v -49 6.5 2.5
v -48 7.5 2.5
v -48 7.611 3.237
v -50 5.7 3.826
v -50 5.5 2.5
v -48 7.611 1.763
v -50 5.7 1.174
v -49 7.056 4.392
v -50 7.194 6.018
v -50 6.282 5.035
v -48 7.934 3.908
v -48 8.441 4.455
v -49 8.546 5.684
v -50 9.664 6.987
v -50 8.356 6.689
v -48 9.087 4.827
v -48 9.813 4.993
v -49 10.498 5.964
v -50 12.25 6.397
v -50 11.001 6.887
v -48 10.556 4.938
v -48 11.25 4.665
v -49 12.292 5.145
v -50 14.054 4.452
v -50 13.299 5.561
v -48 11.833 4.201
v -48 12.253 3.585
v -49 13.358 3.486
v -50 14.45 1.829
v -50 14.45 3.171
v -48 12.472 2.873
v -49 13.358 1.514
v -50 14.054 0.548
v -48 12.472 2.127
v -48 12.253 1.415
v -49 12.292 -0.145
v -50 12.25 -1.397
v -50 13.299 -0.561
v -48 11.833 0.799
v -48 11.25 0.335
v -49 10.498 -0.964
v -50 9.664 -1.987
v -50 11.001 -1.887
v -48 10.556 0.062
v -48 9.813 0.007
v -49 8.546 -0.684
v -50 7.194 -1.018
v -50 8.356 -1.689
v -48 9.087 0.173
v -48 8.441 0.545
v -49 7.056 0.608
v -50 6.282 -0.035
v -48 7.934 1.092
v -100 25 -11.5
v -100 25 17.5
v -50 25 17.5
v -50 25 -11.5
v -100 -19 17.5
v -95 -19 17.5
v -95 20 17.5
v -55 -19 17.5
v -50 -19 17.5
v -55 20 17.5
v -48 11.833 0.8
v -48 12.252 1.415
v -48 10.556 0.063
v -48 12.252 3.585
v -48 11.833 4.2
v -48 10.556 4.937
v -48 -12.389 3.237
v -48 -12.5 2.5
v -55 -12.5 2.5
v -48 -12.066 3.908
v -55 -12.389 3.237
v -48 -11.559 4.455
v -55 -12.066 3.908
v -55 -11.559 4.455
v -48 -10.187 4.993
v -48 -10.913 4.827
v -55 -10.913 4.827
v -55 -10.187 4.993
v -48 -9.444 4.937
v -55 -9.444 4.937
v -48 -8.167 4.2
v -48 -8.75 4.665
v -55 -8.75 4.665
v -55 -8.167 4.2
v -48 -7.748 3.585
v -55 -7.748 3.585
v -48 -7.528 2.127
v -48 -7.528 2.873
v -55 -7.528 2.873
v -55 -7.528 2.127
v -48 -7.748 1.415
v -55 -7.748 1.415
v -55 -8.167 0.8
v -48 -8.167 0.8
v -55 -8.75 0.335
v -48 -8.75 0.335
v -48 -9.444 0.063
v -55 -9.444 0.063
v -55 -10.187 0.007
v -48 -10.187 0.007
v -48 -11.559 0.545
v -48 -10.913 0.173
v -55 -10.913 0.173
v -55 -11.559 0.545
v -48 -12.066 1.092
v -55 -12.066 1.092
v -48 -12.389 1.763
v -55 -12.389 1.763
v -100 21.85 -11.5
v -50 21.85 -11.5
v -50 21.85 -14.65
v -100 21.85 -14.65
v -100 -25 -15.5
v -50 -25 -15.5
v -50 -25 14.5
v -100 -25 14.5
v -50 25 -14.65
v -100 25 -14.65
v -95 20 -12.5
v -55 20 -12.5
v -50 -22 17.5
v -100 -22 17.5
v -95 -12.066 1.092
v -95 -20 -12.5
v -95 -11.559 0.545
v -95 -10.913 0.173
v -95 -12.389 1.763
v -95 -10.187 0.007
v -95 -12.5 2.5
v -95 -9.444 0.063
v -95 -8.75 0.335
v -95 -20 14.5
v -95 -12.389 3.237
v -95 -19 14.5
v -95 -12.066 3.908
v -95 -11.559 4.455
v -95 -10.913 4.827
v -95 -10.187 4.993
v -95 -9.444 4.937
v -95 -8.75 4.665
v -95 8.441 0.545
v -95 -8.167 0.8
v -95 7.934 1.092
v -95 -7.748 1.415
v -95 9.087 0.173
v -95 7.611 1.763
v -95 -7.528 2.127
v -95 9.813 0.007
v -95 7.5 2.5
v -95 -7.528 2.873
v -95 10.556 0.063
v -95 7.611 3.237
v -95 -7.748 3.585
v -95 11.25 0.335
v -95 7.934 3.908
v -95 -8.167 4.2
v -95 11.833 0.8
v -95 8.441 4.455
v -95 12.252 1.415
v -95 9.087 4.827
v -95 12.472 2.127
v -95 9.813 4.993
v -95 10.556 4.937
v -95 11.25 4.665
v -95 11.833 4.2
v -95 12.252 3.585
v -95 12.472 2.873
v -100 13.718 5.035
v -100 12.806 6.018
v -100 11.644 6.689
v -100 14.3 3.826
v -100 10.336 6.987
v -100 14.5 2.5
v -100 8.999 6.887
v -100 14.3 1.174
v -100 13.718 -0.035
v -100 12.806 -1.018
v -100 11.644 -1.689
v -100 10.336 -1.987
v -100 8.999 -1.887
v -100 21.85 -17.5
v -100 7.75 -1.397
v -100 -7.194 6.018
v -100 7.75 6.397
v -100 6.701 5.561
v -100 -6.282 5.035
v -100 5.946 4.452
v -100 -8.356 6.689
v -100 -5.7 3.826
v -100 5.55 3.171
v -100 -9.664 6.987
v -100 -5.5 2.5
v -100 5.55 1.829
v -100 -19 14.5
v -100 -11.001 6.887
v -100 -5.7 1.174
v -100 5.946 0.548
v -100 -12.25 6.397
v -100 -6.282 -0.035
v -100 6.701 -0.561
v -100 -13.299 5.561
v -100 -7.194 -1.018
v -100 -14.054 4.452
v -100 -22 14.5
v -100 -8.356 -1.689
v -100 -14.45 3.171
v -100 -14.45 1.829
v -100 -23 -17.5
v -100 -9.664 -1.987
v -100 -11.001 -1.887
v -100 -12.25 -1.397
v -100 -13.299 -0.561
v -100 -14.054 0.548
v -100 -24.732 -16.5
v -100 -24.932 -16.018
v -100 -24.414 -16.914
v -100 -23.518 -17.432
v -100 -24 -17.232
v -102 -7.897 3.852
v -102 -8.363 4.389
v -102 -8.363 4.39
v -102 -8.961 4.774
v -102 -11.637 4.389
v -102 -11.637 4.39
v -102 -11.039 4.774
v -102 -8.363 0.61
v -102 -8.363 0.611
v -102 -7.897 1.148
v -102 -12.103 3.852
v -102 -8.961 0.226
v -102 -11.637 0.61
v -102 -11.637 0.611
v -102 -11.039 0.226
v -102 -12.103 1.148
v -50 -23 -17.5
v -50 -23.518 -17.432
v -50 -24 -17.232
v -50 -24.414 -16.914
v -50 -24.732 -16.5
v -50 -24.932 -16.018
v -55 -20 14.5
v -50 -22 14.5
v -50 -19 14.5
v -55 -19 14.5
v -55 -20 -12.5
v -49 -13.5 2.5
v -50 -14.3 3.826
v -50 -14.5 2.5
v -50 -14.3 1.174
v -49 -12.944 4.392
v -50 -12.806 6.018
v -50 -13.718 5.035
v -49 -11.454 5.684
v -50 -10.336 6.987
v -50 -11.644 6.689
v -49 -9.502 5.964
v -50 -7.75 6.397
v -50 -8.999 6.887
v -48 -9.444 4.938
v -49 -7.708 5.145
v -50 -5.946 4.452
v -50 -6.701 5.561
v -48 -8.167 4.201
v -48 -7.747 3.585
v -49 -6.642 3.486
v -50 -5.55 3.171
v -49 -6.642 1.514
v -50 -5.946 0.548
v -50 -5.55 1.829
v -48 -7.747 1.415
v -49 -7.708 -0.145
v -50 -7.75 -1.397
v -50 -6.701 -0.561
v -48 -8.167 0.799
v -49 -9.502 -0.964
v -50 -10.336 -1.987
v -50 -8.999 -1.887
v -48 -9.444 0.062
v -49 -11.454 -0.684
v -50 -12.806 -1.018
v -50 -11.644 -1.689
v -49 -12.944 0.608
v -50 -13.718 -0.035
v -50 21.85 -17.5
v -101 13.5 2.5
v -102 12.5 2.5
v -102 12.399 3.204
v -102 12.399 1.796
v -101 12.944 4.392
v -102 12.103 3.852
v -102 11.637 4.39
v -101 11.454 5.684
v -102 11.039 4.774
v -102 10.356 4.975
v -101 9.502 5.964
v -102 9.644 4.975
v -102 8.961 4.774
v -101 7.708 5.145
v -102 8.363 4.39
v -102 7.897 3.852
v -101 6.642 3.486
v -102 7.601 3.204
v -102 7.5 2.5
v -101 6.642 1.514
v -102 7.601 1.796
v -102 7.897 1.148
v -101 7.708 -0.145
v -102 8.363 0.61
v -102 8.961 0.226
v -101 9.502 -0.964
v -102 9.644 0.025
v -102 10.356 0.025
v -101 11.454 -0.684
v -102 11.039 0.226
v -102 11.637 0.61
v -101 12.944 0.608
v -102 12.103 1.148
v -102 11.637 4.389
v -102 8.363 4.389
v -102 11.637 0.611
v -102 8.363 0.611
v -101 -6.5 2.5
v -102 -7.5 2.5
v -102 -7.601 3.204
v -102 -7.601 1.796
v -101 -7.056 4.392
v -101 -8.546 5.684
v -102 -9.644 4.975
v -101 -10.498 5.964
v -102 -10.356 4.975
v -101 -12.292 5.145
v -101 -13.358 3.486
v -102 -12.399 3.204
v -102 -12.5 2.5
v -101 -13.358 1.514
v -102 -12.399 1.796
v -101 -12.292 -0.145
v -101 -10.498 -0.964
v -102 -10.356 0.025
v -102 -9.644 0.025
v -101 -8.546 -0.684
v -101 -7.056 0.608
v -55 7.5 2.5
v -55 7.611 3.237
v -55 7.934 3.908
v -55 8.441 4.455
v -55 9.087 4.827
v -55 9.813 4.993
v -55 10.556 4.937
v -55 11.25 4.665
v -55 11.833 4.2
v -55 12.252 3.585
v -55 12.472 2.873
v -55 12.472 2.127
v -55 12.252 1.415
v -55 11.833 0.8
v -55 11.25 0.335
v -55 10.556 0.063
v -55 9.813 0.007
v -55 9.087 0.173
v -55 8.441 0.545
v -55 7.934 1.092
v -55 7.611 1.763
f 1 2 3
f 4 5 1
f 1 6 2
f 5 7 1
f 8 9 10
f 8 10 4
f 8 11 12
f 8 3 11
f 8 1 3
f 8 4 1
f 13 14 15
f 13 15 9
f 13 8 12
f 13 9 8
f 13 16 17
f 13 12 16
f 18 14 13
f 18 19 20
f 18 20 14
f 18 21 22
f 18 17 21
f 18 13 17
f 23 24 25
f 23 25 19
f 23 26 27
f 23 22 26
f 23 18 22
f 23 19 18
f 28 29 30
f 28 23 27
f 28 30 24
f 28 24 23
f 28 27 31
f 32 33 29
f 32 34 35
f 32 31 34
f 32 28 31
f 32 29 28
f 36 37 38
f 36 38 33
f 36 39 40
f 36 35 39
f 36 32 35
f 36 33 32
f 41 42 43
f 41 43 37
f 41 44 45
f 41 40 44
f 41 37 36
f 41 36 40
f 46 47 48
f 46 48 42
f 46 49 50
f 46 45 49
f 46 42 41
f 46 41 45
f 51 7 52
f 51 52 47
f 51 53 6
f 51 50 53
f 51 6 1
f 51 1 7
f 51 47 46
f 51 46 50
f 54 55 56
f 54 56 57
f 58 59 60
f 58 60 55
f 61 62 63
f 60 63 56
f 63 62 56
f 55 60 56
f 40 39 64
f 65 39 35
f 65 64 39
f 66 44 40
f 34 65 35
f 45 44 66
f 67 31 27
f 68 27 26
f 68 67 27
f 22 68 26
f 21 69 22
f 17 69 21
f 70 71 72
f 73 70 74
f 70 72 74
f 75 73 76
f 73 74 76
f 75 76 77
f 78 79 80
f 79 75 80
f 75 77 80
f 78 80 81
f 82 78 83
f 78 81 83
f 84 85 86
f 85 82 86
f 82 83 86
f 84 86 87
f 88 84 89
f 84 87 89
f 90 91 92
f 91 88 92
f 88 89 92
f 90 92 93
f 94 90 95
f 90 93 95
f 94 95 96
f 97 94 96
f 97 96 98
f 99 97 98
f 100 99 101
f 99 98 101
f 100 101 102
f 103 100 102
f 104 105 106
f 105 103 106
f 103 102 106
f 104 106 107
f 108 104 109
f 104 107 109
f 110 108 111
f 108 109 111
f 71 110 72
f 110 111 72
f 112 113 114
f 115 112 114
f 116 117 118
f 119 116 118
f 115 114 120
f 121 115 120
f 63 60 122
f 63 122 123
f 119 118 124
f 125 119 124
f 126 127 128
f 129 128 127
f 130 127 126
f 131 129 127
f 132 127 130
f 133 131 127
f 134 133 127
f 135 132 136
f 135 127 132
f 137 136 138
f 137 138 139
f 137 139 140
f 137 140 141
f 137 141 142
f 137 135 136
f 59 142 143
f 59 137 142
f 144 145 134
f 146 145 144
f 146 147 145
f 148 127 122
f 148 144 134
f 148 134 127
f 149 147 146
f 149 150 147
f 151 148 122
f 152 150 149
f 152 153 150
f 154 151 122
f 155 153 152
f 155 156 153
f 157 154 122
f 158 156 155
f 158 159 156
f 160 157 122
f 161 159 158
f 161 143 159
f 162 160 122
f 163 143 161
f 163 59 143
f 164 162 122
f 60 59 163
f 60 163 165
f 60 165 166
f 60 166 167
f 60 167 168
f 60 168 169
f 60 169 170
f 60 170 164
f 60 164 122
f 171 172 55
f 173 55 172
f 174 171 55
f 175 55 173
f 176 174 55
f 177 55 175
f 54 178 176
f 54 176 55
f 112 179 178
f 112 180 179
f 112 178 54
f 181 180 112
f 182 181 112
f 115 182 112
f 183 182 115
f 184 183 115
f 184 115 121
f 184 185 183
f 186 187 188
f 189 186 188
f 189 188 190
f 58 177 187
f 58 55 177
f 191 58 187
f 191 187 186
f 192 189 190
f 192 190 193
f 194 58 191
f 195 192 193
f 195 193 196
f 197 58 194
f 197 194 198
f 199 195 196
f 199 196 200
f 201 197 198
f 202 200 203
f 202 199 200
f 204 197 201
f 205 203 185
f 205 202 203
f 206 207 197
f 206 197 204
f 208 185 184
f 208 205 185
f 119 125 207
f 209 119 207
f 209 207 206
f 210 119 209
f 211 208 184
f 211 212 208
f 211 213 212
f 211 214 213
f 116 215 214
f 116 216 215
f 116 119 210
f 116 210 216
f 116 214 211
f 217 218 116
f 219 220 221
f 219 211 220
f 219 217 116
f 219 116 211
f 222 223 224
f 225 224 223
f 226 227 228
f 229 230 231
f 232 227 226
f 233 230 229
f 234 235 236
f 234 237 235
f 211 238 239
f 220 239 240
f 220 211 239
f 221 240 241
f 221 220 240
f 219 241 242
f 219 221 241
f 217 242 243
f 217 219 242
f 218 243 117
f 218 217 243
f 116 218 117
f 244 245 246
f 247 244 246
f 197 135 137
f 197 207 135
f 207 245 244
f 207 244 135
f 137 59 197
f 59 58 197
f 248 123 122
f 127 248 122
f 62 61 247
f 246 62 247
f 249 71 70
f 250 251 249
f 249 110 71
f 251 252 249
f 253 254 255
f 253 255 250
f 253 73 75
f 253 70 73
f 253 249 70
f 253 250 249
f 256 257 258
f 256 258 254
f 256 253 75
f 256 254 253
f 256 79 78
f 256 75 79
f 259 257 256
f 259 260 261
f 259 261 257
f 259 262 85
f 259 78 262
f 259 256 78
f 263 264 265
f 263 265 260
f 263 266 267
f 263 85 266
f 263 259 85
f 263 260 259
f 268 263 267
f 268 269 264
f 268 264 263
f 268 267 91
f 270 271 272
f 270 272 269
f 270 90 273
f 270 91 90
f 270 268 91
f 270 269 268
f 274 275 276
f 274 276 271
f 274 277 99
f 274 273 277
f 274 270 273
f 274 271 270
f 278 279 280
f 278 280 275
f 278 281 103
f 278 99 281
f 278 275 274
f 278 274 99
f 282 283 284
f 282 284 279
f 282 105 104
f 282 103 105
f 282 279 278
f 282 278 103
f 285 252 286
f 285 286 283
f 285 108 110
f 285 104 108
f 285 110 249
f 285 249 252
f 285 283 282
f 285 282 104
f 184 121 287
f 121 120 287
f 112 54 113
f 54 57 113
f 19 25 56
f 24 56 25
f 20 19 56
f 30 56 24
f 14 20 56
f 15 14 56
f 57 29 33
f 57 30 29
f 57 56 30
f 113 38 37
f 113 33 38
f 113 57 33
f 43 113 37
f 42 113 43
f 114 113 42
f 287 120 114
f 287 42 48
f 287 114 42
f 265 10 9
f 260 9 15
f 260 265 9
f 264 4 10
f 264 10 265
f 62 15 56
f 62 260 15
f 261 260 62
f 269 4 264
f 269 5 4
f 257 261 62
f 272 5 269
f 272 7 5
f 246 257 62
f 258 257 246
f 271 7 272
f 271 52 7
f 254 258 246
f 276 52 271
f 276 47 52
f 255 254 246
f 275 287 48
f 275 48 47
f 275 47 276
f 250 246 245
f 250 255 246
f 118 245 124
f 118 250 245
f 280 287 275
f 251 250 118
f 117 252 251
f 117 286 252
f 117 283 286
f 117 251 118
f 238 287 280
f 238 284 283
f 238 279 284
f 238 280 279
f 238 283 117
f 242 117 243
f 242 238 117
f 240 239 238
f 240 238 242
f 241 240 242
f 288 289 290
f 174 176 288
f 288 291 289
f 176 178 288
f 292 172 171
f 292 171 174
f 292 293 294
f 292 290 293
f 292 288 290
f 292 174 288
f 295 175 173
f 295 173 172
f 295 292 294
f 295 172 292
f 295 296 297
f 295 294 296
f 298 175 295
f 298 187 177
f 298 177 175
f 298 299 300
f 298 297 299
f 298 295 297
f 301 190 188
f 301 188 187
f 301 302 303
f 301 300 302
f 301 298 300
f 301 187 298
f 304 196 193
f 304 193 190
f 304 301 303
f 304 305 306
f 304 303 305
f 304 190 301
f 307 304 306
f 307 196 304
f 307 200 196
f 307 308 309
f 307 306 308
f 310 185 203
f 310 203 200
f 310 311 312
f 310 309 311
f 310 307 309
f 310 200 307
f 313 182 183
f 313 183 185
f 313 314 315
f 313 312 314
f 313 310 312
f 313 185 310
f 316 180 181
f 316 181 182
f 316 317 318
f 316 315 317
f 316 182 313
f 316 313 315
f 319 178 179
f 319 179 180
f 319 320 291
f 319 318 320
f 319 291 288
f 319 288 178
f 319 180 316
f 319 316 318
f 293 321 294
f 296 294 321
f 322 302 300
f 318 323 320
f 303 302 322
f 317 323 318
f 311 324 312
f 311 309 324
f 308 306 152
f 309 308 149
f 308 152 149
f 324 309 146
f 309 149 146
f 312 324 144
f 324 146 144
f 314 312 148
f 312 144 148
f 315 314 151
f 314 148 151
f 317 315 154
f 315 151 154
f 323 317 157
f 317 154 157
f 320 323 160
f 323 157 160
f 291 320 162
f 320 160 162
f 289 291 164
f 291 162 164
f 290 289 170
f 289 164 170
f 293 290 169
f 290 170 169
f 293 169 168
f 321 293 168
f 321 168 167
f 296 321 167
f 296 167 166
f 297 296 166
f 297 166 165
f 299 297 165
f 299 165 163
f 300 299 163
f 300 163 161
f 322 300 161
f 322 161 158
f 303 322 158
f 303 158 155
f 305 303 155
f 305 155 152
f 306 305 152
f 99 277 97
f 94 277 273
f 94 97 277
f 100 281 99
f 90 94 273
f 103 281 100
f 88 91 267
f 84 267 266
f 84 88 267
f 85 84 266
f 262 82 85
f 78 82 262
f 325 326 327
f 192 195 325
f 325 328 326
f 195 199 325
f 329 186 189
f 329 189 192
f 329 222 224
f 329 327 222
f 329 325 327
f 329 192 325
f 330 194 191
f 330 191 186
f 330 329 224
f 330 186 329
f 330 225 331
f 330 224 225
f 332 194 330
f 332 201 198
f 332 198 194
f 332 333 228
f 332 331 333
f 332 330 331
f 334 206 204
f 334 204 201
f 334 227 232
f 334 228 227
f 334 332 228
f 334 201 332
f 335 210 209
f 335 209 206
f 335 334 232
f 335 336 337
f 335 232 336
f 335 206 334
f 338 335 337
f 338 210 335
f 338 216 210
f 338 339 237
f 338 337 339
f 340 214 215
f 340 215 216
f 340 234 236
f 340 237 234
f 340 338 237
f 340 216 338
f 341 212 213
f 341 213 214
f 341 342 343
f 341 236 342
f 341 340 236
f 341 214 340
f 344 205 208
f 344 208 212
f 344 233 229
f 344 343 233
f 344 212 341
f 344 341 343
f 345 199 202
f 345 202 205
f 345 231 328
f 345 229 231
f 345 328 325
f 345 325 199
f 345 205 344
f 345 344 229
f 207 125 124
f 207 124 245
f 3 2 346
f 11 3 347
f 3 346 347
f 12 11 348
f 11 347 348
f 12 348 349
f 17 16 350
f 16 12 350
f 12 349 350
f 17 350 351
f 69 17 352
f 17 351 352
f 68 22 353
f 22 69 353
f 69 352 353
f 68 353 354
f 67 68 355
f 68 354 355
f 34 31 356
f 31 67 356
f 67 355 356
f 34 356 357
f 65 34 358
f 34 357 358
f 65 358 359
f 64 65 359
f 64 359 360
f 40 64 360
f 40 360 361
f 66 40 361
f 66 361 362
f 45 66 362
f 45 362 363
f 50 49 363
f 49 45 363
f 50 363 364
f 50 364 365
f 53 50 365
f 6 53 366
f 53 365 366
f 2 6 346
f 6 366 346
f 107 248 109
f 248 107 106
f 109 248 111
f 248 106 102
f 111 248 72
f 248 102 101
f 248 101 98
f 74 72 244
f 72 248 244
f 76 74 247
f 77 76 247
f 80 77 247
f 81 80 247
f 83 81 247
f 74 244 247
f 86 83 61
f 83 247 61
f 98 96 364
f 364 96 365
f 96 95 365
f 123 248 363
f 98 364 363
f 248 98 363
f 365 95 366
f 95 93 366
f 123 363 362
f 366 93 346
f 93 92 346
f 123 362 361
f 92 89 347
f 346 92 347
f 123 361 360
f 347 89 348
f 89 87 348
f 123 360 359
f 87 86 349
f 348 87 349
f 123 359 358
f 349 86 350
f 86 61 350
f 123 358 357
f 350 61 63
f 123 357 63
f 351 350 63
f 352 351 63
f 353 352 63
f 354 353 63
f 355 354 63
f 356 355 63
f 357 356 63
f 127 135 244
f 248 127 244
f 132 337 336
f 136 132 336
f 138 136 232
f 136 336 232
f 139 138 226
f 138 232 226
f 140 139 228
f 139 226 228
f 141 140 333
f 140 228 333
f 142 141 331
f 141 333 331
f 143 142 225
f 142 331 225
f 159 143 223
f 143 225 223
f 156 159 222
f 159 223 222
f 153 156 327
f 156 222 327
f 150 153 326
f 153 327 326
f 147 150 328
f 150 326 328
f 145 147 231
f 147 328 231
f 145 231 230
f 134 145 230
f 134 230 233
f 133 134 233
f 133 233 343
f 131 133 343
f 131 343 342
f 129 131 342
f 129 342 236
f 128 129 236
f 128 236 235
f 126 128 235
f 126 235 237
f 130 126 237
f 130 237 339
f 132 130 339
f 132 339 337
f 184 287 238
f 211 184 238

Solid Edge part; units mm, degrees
sketch "Sketch1" plane through (0, 0, 0) normal (-1, 0, 0) x (0, -1, 0)
  line L0 (25, -17.5) -> (25, 17.5)
  line L1 (25, 17.5) -> (-25, 17.5)
  line L2 (-25, 17.5) -> (-25, -17.5)
  line L3 (-25, -17.5) -> (25, -17.5)
  dimension "D1" = 35
  dimension "D2" = 50
extrude "Protrusion1" add sketch "Sketch1" along normal blind 100
sketch "Sketch2" plane through (-50, 0, 17.5) normal (0, 0, 1) x (0, 1, 0)
  line L0 (20, 45) -> (20, 5)
  line L1 (-20, 5) -> (20, 5)
  line L2 (-20, 45) -> (-20, 5)
  line L3 (-20, 45) -> (20, 45)
  dimension "D1" = 40
  dimension "D2" = 5
  dimension "D3" = 5
extrude "Cutout1" cut sketch "Sketch2" against normal blind 30
sketch "Sketch3" plane through (-105, 10, 2.5) normal (-1, 0, 0) x (0, -1, 0)
  circle A0 centre (0, 0) radius 2.5
  circle A1 centre (20, 0) radius 2.5
extrude "ExtrudedCutout_41" cut sketch "Sketch3" against normal blind 159
fillet "Round_8" radius 2 1 edges at (-50, -25, -17.5)
sketch "Sketch4" plane through (-50, -0.575, -17.5) normal (0, 0, -1) x (0, -1, 0)
  line L0 (-37.0606, 0) -> (53.9819, 0)
  line L1 (41.8981, -54.6569) -> (53.9819, 0)
  line L2 (-28.9495, -54.6569) -> (41.8981, -54.6569)
  line L3 (-37.0606, 0) -> (-28.9495, -54.6569)
  dimension "D1" = 91.0425
  dimension "D2" = 50
  dimension "D3" = 55.2554
  dimension "D4" = 70.8476
  dimension "D5" = 55.9767
extrude "ExtrudedCutout_43" cut sketch "Sketch4" against normal blind 65
sketch "Sketch5" plane through (0, 0, 0) normal (1, 0, 0) x (0, -1, 0)
  line L0 (-25, 11.5) -> (-21.85, 11.5)
  line L1 (-21.85, 11.5) -> (-21.85, 14.65)
  line L2 (-21.85, 14.65) -> (-25, 14.65)
  line L3 (-25, 14.65) -> (-21.85, 17.5)
  line L4 (-21.85, 17.5) -> (-21.85, 20.916)
  line L5 (-21.85, 20.916) -> (-29.169, 20.916)
  line L6 (-29.169, 20.916) -> (-29.169, 11.5)
  line L7 (-29.169, 11.5) -> (-25, 11.5)
  dimension "D1" = 3.15
  dimension "D2" = 3.15
  dimension "D3" = 4.2479
  dimension "D4" = 3.416
  dimension "D5" = 7.319
  dimension "D6" = 9.416
  dimension "D7" = 4.169
extrude "Cutout2" cut sketch "Sketch5" against normal blind 112
sketch "Sketch6" plane through (-50, 0, 0) normal (1, 0, 0) x (0, -1, 0)
  circle A0 centre (-10, -2.5) radius 4.5
  circle A1 centre (10, -2.5) radius 4.5
extrude "ExtrudedProtrusion_35" add sketch "Sketch6" along normal blind 2
chamfer "Chamfer_22" distance 2 angle 45 2 edges at (-48, 14.5, 2.5) (-48, -5.5, 2.5)
sketch "Sketch7" plane through (-100, 0, 0) normal (-1, 0, 0) x (0, 1, 0)
  circle A0 centre (-10, -2.5) radius 4.5
  circle A1 centre (10, -2.5) radius 4.5
extrude "Protrusion2" add sketch "Sketch7" along normal blind 2
chamfer "Chamfer1" distance 2 angle 45 2 edges at (-102, 5.5, 2.5) (-102, -14.5, 2.5)
sketch "Sketch8" plane through (-48, 10, 2.5) normal (1, 0, 0) x (0, -1, 0)
  circle A0 centre (0, 0) radius 2.5
  circle A1 centre (20, 0) radius 2.5
extrude "ExtrudedCutout_46" cut sketch "Sketch8" against normal blind 116
sketch "Sketch9" plane through (-100, 0, 0) normal (-1, 0, 0) x (0, 0, -1)
  line L0 (-17.5, 22) -> (-14.5, 22)
  line L1 (-14.5, 22) -> (-14.5, 19)
  line L2 (-18.2455, 19) -> (-14.5, 19)
  line L3 (-22.1546, 18.9551) -> (-18.2455, 19)
  line L4 (-22.1546, 28.0438) -> (-22.1546, 18.9551)
  line L5 (-14.5, 28.0438) -> (-22.1546, 28.0438)
  line L6 (-14.5, 25) -> (-14.5, 28.0438)
  line L7 (-14.5, 25) -> (-17.5, 22)
  dimension "D1" = 4.2426
  dimension "D2" = 3
  dimension "D3" = 3.0438
  dimension "D4" = 7.6546
  dimension "D5" = 9.0887
extrude "ExtrudedCutout_47" cut sketch "Sketch9" against normal blind 68
